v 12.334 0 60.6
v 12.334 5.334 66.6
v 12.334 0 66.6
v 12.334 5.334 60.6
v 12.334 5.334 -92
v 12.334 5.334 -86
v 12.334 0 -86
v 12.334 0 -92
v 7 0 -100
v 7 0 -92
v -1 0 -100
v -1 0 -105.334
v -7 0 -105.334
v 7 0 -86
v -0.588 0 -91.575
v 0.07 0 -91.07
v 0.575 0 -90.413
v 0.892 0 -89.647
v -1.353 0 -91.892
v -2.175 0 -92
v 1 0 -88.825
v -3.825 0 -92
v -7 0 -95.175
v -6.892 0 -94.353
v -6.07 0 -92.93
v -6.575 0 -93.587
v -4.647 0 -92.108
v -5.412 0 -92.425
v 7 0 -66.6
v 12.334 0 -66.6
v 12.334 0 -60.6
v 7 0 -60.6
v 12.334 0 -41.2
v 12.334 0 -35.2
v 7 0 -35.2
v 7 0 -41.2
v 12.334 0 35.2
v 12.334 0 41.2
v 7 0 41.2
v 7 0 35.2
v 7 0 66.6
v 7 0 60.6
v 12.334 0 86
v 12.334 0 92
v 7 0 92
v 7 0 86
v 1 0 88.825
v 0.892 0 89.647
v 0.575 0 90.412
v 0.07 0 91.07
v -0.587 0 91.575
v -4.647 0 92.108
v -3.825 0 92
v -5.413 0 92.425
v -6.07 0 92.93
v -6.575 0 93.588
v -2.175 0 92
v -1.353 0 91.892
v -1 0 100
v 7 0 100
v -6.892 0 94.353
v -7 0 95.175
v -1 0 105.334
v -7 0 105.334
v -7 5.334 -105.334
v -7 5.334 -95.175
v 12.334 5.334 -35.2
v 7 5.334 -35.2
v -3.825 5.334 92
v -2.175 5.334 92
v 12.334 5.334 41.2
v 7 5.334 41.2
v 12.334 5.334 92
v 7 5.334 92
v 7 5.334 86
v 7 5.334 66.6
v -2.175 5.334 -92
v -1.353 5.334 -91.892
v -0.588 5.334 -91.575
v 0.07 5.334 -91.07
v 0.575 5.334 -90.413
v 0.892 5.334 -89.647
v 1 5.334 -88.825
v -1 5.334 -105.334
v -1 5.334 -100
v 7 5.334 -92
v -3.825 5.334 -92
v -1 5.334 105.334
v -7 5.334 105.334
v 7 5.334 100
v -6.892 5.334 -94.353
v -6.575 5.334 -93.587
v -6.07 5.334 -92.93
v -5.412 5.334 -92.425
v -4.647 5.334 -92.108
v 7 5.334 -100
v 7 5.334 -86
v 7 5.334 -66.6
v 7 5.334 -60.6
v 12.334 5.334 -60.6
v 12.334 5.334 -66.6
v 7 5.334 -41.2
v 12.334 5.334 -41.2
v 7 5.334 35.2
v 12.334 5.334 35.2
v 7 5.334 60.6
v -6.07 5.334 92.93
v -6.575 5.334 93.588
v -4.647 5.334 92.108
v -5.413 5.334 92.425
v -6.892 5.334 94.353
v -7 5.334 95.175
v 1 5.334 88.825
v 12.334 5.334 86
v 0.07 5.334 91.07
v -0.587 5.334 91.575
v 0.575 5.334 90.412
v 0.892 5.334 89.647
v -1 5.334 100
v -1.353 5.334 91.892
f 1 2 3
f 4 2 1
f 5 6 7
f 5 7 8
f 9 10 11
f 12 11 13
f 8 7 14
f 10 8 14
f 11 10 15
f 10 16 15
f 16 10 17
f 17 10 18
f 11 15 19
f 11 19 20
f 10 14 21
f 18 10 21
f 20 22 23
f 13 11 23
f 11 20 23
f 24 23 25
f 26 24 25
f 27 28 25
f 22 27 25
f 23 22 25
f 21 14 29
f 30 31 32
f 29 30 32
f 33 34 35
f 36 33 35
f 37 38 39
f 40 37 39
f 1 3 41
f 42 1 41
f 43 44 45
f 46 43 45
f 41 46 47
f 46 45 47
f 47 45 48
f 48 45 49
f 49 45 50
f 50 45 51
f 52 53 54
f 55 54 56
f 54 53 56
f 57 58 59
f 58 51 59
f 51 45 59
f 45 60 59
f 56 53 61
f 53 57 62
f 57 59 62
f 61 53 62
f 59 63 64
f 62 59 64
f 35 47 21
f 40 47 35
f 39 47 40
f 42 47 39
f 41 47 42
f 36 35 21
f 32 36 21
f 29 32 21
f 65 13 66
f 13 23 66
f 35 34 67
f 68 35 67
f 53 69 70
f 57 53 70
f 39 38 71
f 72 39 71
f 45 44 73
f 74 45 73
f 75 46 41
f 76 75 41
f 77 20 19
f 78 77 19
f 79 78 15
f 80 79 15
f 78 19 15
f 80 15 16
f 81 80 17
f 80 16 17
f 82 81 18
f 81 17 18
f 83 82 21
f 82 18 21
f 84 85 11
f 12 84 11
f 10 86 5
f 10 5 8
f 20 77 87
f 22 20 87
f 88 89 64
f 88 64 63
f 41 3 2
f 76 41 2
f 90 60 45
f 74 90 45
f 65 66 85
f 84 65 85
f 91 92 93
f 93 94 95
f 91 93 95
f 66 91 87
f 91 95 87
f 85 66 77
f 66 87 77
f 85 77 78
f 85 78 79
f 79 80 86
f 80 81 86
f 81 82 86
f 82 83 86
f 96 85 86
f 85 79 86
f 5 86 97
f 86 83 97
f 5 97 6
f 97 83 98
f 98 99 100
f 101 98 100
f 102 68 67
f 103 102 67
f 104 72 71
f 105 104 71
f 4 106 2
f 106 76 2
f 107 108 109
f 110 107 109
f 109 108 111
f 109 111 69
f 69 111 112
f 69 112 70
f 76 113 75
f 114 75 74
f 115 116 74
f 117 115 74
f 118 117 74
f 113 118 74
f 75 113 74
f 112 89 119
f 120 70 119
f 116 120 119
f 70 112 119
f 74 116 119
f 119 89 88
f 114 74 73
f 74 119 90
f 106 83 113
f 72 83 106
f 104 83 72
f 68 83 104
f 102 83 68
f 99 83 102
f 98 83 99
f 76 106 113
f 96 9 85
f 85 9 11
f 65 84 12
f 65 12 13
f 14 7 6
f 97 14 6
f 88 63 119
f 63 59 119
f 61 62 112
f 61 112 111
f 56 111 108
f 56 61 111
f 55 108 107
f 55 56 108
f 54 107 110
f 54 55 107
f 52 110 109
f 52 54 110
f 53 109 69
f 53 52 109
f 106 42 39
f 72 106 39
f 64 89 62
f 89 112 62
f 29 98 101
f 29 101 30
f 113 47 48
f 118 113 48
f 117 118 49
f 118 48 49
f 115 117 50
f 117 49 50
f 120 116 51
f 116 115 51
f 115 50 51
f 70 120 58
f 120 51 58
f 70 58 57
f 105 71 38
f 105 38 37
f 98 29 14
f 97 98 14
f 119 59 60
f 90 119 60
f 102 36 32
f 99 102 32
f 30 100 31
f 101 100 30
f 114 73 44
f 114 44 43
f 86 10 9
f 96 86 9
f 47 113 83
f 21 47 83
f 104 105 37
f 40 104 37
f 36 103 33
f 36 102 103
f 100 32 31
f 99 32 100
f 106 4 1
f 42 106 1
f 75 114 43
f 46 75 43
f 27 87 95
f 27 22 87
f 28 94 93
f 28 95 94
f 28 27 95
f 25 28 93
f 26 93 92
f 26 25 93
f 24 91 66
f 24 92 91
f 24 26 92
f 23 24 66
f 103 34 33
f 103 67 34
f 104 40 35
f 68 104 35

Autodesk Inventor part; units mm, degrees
ref_plane "YZ Plane" through (0, 0, 0) normal (1, 0, 0) x (0, 1, 0)
ref_plane "XZ Plane" through (0, 0, 0) normal (0, 1, 0) x (-1, 0, 0)
ref_plane "XY Plane" through (0, 0, 0) normal (0, 0, 1) x (1, 0, 0)
sketch "Sketch1" plane through (0, 0, 0) normal (0, 1, 0) x (-1, 0, 0)
  line L0 (7, 100) -> (-7, 100)
  line L1 (-7, 100) -> (-7, -100)
  line L2 (-7, -100) -> (7, -100)
  line L3 (7, -100) -> (7, 100)
  point P0 (0, 0)
  point P1 (7, 0)
  point P2 (0, 100)
  dimension "d0" = 14
  dimension "d1" = 200
extrude "Extrusion1" add sketch "Sketch1" along normal blind 5.334
sketch "Sketch2" plane through (0, 5.334, 0) normal (0, 1, 0) x (1, 0, 0)
  line L0 (-7, -92) -> (1, -92)
  line L1 (1, -92) -> (1, 92)
  line L2 (1, 92) -> (-7, 92)
  line L3 (-7, 92) -> (-7, -92)
  line L4 (-7, 100) -> (-7, -100) projected
  line L5 (7, -100) -> (7, 100) projected
  line L6 (-7, -100) -> (7, -100) projected
  line L7 (7, 100) -> (-7, 100) projected
  point P0 (0, 0)
  point P1 (-7, 0)
  dimension "d4" = 6
  dimension "d5" = 8
  dimension "d6" = 8
extrude "Extrusion2" cut sketch "Sketch2" against normal through all contours L3 L2 L1 L0
sketch "Sketch3" plane through (-7, 0, 100) normal (0, 0, 1) x (1, 0, 0)
  line L0 (0, 0) -> (6, 0)
  line L1 (6, 0) -> (6, 5.334)
  line L2 (6, 5.334) -> (0, 5.334)
  line L3 (0, 5.334) -> (0, 0)
  line L4 (0, 5.334) -> (14, 5.334) projected
  point P0 (7, 0)
  point P1 (7, 5.334)
  dimension "d9" = 6
extrude "Extrusion3" add sketch "Sketch3" along normal blind 5.334
sketch "Sketch4" plane through (7, 0, 100) normal (1, 0, 0) x (0, 0, -1)
  line L0 (0, 5.334) -> (200, 5.334) projected
  line L1 (0, 0) -> (200, 0) projected
  line L2 (8, 5.334) -> (14, 5.334)
  line L3 (14, 5.334) -> (14, 0)
  line L4 (14, 0) -> (8, 0)
  line L5 (8, 0) -> (8, 5.334)
  line L6 (0, 0) -> (0, 5.334) projected
  point P0 (100, 0)
  dimension "d13" = 8
  dimension "d14" = 6
extrude "Extrusion4" add sketch "Sketch4" along normal blind 5.334 contours L0 L3 L1 L5
pattern_linear "Rectangular Pattern1" count 3 spacing 25.4 along (0, 0, -1) of "Extrusion4"
mirror "Mirror1" about plane through (0, 0, 0) normal (0, 0, 1) of "Extrusion3", "Extrusion4", "Rectangular Pattern1"
fillet "Fillet2" radius 3.175 4 edges at (-7, 2.667, 92) (1, 2.667, 92) (-7, 2.667, -92) (1, 2.667, -92)
equation "\"d6\" = d5"
properties part number "base_support"
